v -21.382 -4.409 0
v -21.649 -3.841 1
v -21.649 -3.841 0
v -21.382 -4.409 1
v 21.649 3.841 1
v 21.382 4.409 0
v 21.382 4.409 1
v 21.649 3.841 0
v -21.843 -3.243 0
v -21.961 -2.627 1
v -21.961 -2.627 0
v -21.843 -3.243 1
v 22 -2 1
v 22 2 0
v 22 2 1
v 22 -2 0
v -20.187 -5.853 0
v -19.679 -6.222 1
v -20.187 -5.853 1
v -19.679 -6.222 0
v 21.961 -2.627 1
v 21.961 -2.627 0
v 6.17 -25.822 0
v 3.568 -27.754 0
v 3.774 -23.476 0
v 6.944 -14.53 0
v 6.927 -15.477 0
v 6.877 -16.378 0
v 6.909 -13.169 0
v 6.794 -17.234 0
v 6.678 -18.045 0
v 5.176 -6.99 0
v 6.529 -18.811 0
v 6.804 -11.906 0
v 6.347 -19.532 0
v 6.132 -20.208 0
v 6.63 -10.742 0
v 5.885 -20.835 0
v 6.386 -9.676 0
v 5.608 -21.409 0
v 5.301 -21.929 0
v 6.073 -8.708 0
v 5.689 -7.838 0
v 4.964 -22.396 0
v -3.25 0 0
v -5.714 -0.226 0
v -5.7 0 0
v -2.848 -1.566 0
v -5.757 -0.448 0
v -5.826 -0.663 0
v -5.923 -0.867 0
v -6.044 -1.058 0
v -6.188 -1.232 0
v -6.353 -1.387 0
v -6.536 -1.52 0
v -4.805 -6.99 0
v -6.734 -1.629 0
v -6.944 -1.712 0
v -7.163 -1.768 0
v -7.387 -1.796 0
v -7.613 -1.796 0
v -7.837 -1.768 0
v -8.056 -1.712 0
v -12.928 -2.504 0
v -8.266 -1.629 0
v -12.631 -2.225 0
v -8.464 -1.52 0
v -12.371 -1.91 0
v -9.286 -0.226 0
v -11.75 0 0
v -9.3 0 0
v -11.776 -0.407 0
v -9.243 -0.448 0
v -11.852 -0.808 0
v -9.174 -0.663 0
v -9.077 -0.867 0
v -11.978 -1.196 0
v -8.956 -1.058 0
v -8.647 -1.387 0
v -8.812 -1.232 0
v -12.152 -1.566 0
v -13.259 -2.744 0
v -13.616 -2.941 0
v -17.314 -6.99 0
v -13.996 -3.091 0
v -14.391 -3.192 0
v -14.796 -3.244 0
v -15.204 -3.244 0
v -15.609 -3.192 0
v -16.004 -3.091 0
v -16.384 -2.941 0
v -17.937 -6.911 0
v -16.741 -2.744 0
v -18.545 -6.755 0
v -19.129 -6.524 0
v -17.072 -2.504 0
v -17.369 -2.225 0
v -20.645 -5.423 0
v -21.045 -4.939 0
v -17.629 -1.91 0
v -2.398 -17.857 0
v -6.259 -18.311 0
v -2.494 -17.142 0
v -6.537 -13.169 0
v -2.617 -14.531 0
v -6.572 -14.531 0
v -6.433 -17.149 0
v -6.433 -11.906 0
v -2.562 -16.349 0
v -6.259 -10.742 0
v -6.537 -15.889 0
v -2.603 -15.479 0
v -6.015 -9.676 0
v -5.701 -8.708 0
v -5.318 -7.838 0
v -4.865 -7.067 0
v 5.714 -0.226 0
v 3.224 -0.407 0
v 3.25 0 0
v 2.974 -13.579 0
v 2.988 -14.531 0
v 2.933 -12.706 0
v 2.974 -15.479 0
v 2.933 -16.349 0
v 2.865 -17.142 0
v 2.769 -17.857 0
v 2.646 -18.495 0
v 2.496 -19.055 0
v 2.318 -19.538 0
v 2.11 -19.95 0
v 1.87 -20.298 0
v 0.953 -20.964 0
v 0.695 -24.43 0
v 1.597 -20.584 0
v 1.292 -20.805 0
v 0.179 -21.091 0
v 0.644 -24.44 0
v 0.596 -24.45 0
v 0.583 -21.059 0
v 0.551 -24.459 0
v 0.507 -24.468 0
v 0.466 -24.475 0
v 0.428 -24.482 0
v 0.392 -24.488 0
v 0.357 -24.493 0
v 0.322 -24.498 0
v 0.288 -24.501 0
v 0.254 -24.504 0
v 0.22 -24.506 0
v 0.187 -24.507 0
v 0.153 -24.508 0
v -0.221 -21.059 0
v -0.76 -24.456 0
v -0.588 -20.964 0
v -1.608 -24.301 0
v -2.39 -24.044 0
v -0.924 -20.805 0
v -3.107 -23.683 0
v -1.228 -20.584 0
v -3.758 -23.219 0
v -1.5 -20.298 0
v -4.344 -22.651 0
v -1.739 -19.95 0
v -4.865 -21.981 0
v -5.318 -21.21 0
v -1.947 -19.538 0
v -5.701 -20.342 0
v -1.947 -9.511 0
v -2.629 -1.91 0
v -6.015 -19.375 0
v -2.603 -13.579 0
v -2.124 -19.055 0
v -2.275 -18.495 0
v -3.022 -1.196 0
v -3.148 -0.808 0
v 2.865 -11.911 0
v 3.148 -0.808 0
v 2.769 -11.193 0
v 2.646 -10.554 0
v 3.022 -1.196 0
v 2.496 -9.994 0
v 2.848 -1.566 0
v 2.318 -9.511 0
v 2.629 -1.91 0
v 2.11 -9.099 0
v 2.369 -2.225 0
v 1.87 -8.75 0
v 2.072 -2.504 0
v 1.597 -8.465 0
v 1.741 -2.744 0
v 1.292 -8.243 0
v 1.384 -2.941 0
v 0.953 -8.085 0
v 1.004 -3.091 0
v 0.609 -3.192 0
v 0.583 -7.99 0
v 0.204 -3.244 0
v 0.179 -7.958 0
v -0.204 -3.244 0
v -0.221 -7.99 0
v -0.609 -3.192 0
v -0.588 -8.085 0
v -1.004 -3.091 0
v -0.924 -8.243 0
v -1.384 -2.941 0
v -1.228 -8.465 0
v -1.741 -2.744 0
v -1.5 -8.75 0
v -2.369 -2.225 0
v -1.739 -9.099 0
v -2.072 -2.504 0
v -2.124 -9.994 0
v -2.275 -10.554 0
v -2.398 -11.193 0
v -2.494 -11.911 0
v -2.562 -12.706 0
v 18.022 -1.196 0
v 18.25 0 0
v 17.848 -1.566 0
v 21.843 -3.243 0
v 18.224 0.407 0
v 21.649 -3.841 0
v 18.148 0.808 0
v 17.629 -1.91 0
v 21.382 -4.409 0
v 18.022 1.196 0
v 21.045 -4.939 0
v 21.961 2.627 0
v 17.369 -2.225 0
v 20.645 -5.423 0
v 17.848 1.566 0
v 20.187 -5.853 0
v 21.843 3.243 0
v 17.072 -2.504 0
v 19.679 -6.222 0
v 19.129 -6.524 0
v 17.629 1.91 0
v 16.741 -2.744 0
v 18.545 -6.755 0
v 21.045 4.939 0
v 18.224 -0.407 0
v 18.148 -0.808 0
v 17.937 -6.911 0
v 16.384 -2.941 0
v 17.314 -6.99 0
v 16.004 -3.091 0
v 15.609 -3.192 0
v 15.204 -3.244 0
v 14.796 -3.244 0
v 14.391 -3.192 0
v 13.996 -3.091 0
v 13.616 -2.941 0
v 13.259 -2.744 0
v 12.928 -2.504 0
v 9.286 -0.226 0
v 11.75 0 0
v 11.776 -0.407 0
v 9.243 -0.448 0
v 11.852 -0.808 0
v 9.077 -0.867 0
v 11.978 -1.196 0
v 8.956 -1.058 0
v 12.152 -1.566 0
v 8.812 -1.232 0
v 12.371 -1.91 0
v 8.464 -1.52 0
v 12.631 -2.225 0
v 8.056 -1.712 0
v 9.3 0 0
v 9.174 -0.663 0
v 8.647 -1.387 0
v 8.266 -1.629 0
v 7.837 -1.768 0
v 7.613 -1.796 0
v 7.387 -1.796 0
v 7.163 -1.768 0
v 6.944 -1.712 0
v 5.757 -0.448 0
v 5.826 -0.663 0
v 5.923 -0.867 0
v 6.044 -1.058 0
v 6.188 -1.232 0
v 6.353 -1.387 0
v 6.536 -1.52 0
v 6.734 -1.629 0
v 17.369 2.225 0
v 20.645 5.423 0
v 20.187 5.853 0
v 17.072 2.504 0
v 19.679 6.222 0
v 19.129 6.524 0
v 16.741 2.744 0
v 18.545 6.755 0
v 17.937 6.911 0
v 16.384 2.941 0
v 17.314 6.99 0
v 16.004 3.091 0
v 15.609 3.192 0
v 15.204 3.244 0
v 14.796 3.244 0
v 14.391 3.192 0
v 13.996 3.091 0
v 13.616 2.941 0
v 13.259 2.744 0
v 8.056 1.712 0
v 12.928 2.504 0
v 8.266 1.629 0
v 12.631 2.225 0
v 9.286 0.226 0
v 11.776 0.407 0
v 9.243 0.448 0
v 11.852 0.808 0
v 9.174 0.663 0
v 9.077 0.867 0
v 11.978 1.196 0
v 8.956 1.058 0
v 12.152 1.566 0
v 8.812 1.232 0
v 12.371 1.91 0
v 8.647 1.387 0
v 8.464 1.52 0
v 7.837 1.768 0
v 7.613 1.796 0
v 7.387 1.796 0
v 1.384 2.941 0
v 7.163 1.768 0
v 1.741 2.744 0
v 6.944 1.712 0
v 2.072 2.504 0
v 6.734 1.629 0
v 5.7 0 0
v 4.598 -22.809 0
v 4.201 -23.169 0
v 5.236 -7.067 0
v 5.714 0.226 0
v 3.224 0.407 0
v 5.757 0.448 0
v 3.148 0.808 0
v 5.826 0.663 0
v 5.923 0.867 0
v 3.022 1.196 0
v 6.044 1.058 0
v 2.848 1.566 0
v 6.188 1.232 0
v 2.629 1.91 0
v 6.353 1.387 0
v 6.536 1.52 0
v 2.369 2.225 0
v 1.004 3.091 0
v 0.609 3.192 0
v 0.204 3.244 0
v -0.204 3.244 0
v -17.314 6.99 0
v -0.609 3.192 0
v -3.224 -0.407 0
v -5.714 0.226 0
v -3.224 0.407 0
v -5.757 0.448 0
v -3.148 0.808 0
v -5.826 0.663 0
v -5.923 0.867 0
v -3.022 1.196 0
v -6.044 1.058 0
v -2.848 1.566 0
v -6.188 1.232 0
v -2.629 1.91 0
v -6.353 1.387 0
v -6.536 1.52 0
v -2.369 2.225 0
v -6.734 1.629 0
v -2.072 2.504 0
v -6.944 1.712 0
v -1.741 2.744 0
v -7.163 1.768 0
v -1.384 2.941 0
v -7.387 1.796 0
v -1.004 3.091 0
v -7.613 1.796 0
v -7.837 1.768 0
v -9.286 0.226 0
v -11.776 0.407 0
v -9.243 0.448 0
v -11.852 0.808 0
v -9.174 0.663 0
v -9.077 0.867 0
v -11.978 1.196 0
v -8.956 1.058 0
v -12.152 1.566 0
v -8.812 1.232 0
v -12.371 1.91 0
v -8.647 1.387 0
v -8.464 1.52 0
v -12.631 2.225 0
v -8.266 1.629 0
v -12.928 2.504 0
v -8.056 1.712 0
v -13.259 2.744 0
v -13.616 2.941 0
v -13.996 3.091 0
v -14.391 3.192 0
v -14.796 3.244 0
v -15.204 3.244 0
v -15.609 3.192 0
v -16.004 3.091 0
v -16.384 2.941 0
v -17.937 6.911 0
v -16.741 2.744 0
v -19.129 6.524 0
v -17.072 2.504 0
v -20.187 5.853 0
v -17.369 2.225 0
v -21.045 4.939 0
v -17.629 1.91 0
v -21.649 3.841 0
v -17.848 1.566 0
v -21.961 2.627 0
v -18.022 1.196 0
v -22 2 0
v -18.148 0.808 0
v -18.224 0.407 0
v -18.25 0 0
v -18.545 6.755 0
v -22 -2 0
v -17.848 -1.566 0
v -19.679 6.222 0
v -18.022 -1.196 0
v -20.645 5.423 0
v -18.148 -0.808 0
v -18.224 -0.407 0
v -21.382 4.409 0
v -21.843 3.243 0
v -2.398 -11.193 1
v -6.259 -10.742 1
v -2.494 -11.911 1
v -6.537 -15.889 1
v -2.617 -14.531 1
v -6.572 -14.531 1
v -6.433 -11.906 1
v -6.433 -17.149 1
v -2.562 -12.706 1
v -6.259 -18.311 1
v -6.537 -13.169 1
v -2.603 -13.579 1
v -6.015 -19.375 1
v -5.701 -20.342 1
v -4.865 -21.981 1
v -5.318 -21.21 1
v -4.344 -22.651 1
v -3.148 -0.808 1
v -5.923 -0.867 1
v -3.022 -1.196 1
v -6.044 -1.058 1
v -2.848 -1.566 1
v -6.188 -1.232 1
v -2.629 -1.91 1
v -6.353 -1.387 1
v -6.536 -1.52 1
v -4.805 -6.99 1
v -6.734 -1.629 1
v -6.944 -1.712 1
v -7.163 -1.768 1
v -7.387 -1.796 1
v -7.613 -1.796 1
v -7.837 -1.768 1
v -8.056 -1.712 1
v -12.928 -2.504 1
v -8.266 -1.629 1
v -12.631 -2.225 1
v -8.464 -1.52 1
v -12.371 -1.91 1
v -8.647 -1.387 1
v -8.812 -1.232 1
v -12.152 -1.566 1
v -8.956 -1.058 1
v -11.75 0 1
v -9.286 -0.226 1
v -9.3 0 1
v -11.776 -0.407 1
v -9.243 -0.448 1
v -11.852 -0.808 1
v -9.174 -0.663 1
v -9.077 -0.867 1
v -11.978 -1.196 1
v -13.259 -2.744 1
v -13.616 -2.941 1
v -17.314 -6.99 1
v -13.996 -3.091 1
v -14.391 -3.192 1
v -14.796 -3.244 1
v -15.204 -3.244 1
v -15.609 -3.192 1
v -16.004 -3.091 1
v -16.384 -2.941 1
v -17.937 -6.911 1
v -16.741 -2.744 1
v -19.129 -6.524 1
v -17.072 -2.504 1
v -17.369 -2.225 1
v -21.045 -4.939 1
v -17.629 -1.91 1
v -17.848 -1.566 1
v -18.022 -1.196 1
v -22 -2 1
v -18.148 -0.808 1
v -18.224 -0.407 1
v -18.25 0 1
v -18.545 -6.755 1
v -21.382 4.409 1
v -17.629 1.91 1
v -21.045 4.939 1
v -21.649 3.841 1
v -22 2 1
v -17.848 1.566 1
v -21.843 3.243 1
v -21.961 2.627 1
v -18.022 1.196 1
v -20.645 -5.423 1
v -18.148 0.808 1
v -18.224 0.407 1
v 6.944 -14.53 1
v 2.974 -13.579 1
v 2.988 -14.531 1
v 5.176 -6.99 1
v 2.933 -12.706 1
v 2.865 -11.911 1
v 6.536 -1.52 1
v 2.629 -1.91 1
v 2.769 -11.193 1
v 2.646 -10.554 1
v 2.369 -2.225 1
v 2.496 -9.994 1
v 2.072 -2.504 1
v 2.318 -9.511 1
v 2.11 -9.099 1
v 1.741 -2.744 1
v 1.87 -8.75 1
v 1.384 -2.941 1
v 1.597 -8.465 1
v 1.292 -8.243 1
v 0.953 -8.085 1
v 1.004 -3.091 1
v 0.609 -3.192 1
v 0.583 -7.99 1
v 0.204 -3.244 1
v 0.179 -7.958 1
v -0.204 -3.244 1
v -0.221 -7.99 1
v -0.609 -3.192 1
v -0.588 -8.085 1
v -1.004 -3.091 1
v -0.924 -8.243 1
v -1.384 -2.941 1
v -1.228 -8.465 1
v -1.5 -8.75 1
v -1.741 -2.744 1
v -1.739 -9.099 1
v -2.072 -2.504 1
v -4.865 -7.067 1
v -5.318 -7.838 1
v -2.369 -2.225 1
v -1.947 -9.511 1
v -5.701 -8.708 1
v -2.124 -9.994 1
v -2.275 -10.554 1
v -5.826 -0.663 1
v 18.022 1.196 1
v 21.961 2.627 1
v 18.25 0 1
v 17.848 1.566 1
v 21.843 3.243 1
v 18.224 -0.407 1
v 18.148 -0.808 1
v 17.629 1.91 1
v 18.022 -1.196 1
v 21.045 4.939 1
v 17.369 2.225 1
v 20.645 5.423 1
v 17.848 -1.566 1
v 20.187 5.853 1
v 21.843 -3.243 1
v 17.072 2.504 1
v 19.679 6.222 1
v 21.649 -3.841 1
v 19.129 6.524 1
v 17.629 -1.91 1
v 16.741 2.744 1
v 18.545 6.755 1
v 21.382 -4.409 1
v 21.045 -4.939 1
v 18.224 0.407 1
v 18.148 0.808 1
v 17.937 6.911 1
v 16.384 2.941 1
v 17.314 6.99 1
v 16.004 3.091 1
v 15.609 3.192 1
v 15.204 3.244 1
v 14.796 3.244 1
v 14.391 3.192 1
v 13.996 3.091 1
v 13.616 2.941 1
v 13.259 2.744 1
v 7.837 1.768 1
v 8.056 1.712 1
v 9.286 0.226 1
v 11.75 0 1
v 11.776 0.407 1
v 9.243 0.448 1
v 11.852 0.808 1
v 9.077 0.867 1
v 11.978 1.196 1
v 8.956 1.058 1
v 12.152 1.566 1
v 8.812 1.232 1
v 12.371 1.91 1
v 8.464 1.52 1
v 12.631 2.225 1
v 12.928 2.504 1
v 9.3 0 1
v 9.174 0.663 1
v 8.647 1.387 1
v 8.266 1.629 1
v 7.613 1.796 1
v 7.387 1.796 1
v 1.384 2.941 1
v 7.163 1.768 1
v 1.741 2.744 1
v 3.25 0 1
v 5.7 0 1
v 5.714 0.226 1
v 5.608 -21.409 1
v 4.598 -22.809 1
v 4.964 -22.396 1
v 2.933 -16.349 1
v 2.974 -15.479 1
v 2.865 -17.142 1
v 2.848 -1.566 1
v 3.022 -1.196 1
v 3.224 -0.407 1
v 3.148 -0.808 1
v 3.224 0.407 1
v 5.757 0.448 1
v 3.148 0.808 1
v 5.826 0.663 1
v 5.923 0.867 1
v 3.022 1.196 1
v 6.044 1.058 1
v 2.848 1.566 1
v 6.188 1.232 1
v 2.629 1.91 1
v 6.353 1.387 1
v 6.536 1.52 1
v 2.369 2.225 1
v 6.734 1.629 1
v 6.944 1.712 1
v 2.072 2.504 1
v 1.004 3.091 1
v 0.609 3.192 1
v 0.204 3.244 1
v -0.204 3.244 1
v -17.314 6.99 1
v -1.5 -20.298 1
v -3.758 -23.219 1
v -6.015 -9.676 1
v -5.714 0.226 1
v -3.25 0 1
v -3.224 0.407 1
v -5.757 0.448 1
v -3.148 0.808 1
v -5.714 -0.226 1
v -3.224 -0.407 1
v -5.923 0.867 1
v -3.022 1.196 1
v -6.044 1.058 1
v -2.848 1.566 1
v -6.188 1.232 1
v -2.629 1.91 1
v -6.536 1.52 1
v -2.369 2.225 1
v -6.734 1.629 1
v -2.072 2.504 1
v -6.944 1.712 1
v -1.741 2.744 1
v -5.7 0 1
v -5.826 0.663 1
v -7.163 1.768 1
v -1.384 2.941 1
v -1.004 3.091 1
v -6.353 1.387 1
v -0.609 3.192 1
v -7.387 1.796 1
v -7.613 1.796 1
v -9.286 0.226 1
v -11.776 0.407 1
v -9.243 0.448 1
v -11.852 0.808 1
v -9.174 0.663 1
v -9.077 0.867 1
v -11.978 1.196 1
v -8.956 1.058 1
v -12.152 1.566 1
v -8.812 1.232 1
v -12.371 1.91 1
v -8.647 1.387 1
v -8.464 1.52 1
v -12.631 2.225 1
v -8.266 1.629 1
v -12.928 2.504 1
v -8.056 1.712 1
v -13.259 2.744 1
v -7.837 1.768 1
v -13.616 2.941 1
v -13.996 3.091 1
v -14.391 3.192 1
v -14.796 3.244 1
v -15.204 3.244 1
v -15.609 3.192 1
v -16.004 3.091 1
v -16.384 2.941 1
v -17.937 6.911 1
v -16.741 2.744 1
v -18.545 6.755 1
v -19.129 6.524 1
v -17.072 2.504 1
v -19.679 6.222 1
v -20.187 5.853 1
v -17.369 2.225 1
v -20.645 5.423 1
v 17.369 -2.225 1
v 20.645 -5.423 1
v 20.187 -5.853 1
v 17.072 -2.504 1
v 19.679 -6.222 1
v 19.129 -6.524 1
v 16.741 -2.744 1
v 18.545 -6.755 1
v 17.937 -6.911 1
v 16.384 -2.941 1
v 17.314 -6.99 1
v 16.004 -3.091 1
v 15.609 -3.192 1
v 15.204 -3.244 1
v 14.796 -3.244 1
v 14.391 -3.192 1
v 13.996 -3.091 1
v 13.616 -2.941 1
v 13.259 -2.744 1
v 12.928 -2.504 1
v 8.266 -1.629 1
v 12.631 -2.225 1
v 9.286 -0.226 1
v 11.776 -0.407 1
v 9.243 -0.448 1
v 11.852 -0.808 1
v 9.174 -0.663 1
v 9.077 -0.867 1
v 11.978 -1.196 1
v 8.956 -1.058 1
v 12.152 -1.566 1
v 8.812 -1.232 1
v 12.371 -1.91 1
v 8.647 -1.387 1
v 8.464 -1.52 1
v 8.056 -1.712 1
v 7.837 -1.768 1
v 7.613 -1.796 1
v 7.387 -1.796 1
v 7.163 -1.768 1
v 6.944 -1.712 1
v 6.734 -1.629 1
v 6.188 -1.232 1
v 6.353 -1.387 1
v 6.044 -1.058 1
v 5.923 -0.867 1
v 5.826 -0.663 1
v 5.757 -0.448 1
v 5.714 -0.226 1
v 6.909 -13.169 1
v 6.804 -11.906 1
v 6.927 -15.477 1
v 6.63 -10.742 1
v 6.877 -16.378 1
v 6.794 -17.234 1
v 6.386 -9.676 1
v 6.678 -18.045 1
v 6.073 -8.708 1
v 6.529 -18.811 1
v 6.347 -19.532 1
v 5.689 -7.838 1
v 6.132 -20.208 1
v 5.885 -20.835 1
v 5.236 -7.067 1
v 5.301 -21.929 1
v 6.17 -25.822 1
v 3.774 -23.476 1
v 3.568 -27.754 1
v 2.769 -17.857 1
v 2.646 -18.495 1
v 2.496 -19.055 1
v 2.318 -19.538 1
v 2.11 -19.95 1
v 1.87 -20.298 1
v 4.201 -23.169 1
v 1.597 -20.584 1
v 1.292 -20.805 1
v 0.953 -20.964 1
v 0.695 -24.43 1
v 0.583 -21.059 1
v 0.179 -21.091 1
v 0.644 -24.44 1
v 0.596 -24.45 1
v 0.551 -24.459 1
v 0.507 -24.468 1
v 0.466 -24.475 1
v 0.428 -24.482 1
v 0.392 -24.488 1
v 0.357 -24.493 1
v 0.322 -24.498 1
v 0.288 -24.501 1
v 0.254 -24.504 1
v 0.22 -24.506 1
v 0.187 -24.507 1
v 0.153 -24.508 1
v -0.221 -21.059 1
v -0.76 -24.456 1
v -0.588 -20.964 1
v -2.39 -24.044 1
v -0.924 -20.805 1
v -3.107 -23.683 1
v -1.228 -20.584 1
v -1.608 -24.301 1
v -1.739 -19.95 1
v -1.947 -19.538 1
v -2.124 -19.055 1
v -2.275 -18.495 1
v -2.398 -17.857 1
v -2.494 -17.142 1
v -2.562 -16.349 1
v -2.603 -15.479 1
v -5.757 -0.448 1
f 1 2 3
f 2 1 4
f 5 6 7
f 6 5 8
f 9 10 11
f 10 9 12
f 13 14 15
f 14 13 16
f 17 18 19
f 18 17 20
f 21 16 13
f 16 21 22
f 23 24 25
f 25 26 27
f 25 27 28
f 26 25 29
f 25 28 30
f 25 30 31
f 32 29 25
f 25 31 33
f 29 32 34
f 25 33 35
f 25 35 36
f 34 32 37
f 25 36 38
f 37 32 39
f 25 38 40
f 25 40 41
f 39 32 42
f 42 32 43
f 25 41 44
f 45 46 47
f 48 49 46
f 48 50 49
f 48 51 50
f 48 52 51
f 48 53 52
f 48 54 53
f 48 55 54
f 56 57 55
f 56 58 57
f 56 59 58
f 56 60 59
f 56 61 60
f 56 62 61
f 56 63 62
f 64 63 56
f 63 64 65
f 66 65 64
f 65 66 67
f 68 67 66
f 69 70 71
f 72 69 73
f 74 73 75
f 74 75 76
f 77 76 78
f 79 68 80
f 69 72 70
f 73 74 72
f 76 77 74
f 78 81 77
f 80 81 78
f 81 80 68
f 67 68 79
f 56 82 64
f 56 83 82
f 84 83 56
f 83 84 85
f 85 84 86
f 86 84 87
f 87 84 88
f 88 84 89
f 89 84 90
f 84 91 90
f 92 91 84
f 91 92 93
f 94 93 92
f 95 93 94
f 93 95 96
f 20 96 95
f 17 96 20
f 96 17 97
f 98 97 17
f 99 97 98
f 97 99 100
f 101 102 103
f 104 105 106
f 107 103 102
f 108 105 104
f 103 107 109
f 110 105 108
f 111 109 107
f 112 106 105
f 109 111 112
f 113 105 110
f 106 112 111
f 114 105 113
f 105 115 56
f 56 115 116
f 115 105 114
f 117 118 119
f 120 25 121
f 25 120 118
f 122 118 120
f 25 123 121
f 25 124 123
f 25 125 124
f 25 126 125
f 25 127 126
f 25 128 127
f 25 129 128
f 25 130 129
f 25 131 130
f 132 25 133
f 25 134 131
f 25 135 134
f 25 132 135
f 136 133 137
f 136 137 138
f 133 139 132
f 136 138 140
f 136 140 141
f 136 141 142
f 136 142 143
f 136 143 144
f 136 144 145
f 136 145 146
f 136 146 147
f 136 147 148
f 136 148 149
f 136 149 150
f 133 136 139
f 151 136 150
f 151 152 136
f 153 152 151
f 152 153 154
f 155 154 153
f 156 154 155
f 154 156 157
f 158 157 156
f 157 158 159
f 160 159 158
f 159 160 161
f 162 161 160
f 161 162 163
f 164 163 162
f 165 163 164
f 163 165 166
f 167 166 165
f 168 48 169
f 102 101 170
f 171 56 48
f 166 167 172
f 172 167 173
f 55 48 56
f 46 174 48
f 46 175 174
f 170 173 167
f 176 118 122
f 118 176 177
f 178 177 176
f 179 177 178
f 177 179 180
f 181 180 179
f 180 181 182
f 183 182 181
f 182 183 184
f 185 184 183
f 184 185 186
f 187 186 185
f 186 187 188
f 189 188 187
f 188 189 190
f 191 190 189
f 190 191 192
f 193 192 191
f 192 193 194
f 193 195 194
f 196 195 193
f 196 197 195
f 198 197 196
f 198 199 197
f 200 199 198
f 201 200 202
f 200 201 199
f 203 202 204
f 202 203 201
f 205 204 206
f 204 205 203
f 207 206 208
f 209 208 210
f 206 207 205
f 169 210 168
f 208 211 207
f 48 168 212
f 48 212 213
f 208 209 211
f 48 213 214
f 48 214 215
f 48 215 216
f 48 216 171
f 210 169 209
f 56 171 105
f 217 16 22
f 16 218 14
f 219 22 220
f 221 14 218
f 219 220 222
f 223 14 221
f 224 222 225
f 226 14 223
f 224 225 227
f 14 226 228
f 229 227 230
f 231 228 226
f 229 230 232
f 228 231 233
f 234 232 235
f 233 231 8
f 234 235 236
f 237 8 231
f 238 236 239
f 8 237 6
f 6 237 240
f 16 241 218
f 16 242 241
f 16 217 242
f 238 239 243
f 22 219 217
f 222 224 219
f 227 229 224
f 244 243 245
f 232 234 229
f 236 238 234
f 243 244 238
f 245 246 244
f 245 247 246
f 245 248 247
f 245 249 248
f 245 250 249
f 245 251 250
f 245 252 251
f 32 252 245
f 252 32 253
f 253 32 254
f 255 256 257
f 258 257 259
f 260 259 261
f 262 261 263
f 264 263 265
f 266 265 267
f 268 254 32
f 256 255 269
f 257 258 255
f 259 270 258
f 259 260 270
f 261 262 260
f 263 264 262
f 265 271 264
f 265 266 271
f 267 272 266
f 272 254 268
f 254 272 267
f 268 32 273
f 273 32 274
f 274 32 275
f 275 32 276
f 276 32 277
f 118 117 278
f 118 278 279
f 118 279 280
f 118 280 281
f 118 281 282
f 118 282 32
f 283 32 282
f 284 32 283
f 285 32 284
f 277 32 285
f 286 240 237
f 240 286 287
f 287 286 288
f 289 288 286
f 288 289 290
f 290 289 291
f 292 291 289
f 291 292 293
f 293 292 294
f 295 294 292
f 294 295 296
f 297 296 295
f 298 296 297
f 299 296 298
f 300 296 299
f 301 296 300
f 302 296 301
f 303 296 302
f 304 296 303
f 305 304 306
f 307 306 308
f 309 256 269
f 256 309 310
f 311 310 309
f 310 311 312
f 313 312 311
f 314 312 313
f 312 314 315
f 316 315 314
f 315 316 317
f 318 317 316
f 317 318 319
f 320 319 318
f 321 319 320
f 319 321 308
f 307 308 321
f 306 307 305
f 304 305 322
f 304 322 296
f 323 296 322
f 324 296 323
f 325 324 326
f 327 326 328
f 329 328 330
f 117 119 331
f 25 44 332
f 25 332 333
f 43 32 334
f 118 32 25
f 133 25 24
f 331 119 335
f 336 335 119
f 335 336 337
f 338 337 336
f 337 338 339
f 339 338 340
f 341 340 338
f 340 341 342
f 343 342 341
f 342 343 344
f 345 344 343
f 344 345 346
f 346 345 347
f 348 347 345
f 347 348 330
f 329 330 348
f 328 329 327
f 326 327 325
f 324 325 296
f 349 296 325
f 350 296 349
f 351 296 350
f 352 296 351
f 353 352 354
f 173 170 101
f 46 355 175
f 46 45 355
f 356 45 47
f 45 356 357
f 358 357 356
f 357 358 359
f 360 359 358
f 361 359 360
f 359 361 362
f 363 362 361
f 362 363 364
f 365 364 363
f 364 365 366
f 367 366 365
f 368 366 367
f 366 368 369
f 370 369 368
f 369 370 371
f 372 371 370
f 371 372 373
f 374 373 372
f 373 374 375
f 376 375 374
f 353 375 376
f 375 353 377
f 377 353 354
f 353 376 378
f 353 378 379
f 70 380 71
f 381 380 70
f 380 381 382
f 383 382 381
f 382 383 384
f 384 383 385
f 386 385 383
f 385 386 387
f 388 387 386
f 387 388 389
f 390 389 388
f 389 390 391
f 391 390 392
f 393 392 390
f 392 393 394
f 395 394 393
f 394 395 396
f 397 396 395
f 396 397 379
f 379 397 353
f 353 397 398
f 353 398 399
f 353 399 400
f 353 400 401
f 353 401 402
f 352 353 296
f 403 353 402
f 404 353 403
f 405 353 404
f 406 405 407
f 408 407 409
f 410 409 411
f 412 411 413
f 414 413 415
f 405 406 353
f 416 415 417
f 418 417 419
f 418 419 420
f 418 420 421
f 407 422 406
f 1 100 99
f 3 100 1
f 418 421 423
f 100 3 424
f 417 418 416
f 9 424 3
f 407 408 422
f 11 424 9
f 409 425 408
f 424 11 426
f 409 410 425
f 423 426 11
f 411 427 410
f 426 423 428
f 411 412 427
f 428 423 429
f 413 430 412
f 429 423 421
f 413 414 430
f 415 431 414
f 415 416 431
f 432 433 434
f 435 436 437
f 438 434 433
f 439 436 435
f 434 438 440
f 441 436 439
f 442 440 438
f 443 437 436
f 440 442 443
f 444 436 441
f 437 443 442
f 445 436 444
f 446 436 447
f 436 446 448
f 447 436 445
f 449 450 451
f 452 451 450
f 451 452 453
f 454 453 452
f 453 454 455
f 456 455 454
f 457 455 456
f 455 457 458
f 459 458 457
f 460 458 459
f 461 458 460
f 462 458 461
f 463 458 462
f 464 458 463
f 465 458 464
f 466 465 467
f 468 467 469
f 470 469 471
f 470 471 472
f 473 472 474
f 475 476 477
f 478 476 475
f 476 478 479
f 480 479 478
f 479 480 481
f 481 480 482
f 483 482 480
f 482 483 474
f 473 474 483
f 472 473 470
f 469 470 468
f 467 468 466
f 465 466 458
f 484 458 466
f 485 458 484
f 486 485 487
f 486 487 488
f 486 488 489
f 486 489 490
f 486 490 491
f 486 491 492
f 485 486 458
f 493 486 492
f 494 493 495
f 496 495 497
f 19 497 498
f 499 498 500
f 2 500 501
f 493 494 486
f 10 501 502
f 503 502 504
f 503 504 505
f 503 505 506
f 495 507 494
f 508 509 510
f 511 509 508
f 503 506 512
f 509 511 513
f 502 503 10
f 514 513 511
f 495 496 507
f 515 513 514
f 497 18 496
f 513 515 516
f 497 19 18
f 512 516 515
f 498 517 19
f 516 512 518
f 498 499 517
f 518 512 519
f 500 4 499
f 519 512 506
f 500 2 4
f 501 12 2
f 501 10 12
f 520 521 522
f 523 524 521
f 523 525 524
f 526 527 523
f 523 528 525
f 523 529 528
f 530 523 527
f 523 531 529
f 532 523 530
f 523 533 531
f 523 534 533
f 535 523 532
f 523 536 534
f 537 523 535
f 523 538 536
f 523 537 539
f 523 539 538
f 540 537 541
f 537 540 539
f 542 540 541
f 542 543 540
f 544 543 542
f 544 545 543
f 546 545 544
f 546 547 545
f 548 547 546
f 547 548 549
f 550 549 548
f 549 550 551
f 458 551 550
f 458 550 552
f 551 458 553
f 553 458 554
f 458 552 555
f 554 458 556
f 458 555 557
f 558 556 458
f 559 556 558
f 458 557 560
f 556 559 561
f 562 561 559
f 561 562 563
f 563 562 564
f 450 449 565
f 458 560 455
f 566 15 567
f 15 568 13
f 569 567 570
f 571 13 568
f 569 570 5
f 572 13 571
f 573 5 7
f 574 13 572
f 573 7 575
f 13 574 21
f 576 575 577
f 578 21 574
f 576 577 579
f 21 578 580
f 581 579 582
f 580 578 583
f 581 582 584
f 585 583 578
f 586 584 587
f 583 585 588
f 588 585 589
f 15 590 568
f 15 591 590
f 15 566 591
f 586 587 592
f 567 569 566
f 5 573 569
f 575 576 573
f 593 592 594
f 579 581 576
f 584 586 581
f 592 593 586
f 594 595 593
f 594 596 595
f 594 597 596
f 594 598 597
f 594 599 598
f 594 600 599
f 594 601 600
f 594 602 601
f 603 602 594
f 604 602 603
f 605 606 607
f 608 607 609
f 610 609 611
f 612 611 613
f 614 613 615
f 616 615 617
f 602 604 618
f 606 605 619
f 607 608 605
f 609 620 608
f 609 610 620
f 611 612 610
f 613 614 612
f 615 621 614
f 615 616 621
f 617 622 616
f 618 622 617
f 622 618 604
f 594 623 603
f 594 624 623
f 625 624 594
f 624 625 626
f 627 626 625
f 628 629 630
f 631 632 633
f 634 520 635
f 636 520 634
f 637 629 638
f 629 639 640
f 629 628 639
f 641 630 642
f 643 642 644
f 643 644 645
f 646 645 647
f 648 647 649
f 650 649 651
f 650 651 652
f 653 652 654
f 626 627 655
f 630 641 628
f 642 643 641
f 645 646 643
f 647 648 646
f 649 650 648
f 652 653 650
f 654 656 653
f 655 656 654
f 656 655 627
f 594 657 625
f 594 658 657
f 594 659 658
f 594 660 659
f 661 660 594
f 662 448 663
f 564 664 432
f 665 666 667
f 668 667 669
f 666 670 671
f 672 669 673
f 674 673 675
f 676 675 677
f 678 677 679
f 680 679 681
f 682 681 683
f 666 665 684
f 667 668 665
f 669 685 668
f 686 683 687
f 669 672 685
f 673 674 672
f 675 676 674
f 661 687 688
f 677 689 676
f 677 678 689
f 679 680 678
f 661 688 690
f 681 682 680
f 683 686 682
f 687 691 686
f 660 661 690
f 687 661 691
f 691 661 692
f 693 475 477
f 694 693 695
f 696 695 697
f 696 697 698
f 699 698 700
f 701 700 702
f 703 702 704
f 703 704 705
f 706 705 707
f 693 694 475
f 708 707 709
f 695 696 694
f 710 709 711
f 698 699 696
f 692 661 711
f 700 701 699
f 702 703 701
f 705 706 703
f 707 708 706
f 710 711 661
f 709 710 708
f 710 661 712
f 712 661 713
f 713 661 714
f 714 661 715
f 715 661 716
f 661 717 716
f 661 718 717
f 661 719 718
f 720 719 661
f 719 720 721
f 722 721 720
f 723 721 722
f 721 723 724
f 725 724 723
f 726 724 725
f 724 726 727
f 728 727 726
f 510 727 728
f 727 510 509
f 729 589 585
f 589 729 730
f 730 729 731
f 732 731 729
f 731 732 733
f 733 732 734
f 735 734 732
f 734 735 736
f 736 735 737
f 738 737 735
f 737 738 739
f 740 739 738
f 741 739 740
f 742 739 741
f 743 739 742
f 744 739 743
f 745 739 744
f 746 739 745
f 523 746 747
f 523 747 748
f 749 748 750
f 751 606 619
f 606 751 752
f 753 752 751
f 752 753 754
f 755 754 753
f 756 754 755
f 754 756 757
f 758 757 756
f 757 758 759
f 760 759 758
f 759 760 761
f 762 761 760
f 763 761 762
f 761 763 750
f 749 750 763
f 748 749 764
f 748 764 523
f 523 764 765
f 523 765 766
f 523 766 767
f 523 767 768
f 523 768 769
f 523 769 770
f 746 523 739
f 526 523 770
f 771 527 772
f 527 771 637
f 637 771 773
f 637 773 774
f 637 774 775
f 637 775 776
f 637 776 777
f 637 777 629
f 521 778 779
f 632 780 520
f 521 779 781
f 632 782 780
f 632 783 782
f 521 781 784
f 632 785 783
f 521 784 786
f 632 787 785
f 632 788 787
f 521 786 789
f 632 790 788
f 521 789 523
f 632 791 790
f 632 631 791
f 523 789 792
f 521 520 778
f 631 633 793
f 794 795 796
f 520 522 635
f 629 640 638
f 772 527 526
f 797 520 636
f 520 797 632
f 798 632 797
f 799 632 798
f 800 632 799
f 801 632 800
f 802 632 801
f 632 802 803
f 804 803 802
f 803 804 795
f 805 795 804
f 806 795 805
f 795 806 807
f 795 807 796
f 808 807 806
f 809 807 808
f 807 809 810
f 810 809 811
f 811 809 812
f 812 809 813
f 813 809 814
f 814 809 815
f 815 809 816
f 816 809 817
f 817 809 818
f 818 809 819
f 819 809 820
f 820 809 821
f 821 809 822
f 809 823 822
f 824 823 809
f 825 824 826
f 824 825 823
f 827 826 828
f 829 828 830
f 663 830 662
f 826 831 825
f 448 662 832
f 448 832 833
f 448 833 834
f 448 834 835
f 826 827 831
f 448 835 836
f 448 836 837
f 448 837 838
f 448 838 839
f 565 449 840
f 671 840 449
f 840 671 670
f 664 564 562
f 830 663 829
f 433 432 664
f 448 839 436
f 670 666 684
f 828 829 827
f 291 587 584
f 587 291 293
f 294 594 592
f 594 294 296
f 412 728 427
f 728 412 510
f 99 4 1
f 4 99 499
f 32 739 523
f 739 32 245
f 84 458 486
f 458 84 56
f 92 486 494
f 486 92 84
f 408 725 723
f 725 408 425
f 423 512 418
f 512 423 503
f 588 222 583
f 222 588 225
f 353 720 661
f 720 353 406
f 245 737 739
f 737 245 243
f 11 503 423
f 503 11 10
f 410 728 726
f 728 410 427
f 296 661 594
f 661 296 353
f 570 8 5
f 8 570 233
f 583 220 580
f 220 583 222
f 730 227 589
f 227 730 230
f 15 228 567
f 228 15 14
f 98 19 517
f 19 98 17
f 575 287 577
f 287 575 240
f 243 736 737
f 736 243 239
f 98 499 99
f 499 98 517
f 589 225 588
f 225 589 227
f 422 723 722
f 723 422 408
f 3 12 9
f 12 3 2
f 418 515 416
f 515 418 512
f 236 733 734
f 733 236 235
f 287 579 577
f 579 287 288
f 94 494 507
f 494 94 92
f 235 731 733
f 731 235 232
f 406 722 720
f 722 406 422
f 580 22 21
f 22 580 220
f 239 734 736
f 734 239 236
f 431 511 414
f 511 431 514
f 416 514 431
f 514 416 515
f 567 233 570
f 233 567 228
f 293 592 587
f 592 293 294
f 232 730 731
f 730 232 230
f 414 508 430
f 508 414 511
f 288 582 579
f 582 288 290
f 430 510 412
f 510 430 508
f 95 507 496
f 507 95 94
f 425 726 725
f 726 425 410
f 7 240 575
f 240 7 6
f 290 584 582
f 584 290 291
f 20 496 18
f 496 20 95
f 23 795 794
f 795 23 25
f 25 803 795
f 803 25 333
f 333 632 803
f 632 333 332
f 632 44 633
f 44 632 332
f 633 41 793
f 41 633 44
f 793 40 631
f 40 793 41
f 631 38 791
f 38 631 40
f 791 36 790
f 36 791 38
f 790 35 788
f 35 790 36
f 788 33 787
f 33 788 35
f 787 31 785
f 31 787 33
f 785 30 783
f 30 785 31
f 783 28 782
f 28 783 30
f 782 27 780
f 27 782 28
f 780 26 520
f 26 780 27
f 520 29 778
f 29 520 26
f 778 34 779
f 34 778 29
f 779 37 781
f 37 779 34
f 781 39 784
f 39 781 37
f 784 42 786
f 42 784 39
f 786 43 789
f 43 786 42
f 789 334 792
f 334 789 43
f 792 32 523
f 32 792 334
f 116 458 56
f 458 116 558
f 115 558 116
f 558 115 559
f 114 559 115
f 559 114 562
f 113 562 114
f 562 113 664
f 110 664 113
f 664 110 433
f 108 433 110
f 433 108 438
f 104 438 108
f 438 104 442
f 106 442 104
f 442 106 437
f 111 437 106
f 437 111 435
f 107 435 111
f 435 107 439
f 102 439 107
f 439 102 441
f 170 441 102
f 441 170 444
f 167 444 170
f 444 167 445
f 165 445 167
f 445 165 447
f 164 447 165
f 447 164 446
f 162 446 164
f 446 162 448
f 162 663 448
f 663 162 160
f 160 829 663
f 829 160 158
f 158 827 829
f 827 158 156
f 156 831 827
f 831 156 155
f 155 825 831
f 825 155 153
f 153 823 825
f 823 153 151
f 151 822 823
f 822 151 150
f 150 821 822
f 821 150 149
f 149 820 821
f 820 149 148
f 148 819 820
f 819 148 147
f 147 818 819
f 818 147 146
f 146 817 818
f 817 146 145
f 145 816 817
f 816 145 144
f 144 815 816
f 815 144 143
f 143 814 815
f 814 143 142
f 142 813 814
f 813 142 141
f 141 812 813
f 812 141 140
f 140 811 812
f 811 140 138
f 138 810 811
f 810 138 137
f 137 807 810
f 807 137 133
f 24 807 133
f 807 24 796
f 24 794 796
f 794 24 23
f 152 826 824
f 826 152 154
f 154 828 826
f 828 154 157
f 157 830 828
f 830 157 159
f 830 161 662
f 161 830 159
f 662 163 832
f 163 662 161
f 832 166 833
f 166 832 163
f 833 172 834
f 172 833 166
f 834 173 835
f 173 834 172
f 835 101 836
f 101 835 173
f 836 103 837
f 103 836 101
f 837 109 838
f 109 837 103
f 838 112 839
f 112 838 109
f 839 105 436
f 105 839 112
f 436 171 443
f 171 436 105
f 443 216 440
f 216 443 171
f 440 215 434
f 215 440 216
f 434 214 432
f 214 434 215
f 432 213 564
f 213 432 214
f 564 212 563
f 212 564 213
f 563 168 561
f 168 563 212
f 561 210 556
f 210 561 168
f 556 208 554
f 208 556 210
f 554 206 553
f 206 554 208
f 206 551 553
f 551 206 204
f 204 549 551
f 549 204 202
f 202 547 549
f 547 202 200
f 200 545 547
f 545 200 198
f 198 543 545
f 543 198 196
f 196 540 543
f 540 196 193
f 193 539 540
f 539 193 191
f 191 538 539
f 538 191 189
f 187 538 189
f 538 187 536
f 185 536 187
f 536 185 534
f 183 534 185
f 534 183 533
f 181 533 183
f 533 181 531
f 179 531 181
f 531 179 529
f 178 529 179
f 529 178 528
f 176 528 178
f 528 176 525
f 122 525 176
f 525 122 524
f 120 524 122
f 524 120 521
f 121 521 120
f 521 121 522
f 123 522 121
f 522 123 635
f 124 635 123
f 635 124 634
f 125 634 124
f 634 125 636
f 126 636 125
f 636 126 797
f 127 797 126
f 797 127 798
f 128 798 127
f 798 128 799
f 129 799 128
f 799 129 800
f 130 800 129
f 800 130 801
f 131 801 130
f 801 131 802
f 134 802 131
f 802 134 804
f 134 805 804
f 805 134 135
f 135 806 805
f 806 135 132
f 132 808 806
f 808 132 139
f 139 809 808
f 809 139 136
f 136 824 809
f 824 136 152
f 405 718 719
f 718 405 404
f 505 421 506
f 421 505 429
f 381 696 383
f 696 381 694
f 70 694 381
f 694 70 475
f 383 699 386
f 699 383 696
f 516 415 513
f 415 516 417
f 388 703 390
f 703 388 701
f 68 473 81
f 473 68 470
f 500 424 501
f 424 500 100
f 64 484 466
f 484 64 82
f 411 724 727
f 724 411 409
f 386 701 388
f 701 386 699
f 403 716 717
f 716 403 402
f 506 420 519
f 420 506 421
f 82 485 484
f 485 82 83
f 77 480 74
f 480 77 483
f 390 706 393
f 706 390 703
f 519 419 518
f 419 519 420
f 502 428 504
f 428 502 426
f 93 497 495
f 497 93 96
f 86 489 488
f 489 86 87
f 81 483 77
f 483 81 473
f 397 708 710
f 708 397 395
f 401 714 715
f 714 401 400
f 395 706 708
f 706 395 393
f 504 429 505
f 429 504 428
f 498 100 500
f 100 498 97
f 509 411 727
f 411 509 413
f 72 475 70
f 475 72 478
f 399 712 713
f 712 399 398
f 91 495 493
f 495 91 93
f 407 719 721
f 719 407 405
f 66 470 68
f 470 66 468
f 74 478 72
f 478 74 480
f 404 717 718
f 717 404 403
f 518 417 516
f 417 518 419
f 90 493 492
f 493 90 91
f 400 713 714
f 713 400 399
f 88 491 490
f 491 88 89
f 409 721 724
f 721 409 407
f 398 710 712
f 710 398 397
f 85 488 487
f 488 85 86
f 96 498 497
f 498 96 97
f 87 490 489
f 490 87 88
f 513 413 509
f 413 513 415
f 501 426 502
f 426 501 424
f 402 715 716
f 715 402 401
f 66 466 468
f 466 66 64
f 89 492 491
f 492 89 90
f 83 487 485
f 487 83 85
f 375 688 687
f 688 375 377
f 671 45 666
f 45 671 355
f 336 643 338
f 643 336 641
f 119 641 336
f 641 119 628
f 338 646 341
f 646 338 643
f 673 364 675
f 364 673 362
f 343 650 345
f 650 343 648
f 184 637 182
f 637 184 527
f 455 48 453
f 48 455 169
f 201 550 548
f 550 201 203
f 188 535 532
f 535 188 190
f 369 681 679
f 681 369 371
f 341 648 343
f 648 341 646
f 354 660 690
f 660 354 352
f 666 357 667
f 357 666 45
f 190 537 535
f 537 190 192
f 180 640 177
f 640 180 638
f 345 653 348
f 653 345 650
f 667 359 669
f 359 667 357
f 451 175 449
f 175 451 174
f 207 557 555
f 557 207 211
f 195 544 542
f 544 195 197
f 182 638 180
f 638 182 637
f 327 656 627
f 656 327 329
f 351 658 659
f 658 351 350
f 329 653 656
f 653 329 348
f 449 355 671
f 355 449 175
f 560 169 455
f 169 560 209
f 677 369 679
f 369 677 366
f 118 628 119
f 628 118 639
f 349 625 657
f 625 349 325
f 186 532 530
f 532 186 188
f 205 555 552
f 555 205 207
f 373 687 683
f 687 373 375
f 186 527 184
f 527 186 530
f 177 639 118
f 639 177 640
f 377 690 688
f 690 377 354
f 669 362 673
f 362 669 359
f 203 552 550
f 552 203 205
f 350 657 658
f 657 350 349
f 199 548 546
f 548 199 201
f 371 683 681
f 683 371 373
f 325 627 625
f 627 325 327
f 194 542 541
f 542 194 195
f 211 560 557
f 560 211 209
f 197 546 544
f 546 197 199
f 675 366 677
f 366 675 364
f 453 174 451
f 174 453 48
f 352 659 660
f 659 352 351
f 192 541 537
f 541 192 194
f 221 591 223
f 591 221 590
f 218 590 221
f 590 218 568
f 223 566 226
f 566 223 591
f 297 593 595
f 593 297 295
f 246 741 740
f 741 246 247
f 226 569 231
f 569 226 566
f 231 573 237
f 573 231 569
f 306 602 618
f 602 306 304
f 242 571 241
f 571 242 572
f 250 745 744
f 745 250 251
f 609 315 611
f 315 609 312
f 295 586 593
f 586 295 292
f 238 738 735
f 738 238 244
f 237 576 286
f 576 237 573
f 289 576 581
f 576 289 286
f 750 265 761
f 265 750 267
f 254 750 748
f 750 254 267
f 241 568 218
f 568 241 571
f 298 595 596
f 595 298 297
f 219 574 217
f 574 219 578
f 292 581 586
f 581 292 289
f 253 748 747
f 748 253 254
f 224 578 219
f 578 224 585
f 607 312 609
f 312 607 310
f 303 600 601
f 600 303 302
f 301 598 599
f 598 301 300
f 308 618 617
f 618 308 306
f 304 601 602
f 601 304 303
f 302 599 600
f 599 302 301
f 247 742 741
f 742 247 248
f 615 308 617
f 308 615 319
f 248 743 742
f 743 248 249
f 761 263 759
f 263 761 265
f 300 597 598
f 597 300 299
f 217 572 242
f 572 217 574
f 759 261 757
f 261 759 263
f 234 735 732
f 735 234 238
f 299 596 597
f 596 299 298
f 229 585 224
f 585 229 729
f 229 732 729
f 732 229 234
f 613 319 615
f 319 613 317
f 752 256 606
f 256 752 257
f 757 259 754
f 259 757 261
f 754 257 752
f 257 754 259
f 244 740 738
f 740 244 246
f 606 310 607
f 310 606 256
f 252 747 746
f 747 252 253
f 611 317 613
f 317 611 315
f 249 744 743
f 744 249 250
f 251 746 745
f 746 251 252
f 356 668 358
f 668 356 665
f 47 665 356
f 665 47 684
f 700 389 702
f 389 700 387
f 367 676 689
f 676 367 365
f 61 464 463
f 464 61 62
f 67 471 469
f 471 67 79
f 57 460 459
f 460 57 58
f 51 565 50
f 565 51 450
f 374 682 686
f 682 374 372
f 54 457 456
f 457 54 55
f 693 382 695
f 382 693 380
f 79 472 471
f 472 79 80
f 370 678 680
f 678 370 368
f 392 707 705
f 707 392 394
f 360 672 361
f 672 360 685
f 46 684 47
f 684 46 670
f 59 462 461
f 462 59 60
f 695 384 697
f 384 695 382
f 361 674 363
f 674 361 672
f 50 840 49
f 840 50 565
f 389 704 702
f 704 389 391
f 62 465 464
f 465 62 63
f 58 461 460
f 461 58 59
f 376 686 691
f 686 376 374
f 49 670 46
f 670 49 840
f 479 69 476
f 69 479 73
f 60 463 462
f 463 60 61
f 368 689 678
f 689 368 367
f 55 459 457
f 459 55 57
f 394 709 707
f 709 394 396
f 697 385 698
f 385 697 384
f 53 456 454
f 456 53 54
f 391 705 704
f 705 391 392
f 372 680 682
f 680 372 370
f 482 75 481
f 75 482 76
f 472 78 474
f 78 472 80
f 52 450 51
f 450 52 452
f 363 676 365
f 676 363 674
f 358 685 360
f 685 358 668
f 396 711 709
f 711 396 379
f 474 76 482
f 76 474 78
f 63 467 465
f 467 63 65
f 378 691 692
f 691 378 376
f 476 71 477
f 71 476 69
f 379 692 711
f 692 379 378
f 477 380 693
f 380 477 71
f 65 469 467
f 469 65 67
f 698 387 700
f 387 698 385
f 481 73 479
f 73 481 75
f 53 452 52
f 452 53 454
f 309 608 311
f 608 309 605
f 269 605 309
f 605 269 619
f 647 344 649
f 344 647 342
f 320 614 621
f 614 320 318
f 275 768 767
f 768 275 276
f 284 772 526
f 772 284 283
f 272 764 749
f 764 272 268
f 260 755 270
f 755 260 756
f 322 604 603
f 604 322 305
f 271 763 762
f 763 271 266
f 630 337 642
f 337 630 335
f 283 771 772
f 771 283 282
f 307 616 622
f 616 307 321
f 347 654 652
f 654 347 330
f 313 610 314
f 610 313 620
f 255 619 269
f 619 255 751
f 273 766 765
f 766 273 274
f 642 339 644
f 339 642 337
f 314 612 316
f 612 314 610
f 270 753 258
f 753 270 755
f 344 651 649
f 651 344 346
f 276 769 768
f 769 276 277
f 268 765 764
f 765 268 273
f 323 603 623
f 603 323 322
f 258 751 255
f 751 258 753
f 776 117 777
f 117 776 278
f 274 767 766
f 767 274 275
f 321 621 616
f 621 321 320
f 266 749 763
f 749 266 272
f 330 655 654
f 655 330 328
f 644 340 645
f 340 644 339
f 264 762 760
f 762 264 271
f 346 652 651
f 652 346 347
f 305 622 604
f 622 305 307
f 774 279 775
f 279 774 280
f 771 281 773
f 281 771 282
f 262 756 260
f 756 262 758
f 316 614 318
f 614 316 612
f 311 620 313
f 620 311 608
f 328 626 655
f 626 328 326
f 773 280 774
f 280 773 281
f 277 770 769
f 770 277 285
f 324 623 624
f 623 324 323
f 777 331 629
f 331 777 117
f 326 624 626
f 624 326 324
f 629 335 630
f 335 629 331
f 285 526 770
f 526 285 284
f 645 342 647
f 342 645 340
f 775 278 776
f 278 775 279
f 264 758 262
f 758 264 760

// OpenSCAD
$fn = 50;


difference() {
	union() {
		*color(alpha = 1.0000000000, c = "gray") {
			translate(v = [0, 14, 0]) {
				linear_extrude(height = 1) {
					text(font = "Arial:style=Bold", halign = "center", size = 4.5000000000, text = "COMMENT description oobb_plate_shape_p_type_1_depth_3_width_1_thickness_q_extra_oobb_size", valign = "center");
				}
			}
		}
		hull() {
			translate(v = [-17.0000000000, 2.0000000000, 0]) {
				cylinder(h = 1, r = 5);
			}
			translate(v = [17.0000000000, 2.0000000000, 0]) {
				cylinder(h = 1, r = 5);
			}
			translate(v = [-17.0000000000, -2.0000000000, 0]) {
				cylinder(h = 1, r = 5);
			}
			translate(v = [17.0000000000, -2.0000000000, 0]) {
				cylinder(h = 1, r = 5);
			}
		}
		translate(v = [0, -5, 0]) {
			linear_extrude(height = 1) {
				text(font = "DejaVu Sans Mono:style=Bold", halign = "center", size = 19.0000000000, text = "Q", valign = "top");
			}
		}
	}
	union() {
		*color(alpha = 1.0000000000, c = "gray") {
			translate(v = [0, 14, 0]) {
				linear_extrude(height = 1) {
					text(font = "Arial:style=Bold", halign = "center", size = 4.5000000000, text = "COMMENT description oobb_holes_shape_n_type_3_width_1_thickness_q_extra_oobb_size_1_height_'all'_holes_true_both_holes", valign = "center");
				}
			}
		}
		translate(v = [-15.0000000000, 0.0000000000, 0]) {
			translate(v = [0, 0, -50]) {
				cylinder(h = 100, r = 3.2500000000);
			}
		}
		translate(v = [0, 0, -50]) {
			cylinder(h = 100, r = 3.2500000000);
		}
		translate(v = [15.0000000000, 0.0000000000, 0]) {
			translate(v = [0, 0, -50]) {
				cylinder(h = 100, r = 3.2500000000);
			}
		}
		translate(v = [-15.0000000000, 0.0000000000, 0]) {
			translate(v = [0, 0, -50]) {
				cylinder(h = 100, r = 1.8000000000);
			}
		}
		translate(v = [-7.5000000000, 0.0000000000, 0]) {
			translate(v = [0, 0, -50]) {
				cylinder(h = 100, r = 1.8000000000);
			}
		}
		translate(v = [0, 0, -50]) {
			cylinder(h = 100, r = 1.8000000000);
		}
		translate(v = [7.5000000000, 0.0000000000, 0]) {
			translate(v = [0, 0, -50]) {
				cylinder(h = 100, r = 1.8000000000);
			}
		}
		translate(v = [15.0000000000, 0.0000000000, 0]) {
			translate(v = [0, 0, -50]) {
				cylinder(h = 100, r = 1.8000000000);
			}
		}
	}
}
